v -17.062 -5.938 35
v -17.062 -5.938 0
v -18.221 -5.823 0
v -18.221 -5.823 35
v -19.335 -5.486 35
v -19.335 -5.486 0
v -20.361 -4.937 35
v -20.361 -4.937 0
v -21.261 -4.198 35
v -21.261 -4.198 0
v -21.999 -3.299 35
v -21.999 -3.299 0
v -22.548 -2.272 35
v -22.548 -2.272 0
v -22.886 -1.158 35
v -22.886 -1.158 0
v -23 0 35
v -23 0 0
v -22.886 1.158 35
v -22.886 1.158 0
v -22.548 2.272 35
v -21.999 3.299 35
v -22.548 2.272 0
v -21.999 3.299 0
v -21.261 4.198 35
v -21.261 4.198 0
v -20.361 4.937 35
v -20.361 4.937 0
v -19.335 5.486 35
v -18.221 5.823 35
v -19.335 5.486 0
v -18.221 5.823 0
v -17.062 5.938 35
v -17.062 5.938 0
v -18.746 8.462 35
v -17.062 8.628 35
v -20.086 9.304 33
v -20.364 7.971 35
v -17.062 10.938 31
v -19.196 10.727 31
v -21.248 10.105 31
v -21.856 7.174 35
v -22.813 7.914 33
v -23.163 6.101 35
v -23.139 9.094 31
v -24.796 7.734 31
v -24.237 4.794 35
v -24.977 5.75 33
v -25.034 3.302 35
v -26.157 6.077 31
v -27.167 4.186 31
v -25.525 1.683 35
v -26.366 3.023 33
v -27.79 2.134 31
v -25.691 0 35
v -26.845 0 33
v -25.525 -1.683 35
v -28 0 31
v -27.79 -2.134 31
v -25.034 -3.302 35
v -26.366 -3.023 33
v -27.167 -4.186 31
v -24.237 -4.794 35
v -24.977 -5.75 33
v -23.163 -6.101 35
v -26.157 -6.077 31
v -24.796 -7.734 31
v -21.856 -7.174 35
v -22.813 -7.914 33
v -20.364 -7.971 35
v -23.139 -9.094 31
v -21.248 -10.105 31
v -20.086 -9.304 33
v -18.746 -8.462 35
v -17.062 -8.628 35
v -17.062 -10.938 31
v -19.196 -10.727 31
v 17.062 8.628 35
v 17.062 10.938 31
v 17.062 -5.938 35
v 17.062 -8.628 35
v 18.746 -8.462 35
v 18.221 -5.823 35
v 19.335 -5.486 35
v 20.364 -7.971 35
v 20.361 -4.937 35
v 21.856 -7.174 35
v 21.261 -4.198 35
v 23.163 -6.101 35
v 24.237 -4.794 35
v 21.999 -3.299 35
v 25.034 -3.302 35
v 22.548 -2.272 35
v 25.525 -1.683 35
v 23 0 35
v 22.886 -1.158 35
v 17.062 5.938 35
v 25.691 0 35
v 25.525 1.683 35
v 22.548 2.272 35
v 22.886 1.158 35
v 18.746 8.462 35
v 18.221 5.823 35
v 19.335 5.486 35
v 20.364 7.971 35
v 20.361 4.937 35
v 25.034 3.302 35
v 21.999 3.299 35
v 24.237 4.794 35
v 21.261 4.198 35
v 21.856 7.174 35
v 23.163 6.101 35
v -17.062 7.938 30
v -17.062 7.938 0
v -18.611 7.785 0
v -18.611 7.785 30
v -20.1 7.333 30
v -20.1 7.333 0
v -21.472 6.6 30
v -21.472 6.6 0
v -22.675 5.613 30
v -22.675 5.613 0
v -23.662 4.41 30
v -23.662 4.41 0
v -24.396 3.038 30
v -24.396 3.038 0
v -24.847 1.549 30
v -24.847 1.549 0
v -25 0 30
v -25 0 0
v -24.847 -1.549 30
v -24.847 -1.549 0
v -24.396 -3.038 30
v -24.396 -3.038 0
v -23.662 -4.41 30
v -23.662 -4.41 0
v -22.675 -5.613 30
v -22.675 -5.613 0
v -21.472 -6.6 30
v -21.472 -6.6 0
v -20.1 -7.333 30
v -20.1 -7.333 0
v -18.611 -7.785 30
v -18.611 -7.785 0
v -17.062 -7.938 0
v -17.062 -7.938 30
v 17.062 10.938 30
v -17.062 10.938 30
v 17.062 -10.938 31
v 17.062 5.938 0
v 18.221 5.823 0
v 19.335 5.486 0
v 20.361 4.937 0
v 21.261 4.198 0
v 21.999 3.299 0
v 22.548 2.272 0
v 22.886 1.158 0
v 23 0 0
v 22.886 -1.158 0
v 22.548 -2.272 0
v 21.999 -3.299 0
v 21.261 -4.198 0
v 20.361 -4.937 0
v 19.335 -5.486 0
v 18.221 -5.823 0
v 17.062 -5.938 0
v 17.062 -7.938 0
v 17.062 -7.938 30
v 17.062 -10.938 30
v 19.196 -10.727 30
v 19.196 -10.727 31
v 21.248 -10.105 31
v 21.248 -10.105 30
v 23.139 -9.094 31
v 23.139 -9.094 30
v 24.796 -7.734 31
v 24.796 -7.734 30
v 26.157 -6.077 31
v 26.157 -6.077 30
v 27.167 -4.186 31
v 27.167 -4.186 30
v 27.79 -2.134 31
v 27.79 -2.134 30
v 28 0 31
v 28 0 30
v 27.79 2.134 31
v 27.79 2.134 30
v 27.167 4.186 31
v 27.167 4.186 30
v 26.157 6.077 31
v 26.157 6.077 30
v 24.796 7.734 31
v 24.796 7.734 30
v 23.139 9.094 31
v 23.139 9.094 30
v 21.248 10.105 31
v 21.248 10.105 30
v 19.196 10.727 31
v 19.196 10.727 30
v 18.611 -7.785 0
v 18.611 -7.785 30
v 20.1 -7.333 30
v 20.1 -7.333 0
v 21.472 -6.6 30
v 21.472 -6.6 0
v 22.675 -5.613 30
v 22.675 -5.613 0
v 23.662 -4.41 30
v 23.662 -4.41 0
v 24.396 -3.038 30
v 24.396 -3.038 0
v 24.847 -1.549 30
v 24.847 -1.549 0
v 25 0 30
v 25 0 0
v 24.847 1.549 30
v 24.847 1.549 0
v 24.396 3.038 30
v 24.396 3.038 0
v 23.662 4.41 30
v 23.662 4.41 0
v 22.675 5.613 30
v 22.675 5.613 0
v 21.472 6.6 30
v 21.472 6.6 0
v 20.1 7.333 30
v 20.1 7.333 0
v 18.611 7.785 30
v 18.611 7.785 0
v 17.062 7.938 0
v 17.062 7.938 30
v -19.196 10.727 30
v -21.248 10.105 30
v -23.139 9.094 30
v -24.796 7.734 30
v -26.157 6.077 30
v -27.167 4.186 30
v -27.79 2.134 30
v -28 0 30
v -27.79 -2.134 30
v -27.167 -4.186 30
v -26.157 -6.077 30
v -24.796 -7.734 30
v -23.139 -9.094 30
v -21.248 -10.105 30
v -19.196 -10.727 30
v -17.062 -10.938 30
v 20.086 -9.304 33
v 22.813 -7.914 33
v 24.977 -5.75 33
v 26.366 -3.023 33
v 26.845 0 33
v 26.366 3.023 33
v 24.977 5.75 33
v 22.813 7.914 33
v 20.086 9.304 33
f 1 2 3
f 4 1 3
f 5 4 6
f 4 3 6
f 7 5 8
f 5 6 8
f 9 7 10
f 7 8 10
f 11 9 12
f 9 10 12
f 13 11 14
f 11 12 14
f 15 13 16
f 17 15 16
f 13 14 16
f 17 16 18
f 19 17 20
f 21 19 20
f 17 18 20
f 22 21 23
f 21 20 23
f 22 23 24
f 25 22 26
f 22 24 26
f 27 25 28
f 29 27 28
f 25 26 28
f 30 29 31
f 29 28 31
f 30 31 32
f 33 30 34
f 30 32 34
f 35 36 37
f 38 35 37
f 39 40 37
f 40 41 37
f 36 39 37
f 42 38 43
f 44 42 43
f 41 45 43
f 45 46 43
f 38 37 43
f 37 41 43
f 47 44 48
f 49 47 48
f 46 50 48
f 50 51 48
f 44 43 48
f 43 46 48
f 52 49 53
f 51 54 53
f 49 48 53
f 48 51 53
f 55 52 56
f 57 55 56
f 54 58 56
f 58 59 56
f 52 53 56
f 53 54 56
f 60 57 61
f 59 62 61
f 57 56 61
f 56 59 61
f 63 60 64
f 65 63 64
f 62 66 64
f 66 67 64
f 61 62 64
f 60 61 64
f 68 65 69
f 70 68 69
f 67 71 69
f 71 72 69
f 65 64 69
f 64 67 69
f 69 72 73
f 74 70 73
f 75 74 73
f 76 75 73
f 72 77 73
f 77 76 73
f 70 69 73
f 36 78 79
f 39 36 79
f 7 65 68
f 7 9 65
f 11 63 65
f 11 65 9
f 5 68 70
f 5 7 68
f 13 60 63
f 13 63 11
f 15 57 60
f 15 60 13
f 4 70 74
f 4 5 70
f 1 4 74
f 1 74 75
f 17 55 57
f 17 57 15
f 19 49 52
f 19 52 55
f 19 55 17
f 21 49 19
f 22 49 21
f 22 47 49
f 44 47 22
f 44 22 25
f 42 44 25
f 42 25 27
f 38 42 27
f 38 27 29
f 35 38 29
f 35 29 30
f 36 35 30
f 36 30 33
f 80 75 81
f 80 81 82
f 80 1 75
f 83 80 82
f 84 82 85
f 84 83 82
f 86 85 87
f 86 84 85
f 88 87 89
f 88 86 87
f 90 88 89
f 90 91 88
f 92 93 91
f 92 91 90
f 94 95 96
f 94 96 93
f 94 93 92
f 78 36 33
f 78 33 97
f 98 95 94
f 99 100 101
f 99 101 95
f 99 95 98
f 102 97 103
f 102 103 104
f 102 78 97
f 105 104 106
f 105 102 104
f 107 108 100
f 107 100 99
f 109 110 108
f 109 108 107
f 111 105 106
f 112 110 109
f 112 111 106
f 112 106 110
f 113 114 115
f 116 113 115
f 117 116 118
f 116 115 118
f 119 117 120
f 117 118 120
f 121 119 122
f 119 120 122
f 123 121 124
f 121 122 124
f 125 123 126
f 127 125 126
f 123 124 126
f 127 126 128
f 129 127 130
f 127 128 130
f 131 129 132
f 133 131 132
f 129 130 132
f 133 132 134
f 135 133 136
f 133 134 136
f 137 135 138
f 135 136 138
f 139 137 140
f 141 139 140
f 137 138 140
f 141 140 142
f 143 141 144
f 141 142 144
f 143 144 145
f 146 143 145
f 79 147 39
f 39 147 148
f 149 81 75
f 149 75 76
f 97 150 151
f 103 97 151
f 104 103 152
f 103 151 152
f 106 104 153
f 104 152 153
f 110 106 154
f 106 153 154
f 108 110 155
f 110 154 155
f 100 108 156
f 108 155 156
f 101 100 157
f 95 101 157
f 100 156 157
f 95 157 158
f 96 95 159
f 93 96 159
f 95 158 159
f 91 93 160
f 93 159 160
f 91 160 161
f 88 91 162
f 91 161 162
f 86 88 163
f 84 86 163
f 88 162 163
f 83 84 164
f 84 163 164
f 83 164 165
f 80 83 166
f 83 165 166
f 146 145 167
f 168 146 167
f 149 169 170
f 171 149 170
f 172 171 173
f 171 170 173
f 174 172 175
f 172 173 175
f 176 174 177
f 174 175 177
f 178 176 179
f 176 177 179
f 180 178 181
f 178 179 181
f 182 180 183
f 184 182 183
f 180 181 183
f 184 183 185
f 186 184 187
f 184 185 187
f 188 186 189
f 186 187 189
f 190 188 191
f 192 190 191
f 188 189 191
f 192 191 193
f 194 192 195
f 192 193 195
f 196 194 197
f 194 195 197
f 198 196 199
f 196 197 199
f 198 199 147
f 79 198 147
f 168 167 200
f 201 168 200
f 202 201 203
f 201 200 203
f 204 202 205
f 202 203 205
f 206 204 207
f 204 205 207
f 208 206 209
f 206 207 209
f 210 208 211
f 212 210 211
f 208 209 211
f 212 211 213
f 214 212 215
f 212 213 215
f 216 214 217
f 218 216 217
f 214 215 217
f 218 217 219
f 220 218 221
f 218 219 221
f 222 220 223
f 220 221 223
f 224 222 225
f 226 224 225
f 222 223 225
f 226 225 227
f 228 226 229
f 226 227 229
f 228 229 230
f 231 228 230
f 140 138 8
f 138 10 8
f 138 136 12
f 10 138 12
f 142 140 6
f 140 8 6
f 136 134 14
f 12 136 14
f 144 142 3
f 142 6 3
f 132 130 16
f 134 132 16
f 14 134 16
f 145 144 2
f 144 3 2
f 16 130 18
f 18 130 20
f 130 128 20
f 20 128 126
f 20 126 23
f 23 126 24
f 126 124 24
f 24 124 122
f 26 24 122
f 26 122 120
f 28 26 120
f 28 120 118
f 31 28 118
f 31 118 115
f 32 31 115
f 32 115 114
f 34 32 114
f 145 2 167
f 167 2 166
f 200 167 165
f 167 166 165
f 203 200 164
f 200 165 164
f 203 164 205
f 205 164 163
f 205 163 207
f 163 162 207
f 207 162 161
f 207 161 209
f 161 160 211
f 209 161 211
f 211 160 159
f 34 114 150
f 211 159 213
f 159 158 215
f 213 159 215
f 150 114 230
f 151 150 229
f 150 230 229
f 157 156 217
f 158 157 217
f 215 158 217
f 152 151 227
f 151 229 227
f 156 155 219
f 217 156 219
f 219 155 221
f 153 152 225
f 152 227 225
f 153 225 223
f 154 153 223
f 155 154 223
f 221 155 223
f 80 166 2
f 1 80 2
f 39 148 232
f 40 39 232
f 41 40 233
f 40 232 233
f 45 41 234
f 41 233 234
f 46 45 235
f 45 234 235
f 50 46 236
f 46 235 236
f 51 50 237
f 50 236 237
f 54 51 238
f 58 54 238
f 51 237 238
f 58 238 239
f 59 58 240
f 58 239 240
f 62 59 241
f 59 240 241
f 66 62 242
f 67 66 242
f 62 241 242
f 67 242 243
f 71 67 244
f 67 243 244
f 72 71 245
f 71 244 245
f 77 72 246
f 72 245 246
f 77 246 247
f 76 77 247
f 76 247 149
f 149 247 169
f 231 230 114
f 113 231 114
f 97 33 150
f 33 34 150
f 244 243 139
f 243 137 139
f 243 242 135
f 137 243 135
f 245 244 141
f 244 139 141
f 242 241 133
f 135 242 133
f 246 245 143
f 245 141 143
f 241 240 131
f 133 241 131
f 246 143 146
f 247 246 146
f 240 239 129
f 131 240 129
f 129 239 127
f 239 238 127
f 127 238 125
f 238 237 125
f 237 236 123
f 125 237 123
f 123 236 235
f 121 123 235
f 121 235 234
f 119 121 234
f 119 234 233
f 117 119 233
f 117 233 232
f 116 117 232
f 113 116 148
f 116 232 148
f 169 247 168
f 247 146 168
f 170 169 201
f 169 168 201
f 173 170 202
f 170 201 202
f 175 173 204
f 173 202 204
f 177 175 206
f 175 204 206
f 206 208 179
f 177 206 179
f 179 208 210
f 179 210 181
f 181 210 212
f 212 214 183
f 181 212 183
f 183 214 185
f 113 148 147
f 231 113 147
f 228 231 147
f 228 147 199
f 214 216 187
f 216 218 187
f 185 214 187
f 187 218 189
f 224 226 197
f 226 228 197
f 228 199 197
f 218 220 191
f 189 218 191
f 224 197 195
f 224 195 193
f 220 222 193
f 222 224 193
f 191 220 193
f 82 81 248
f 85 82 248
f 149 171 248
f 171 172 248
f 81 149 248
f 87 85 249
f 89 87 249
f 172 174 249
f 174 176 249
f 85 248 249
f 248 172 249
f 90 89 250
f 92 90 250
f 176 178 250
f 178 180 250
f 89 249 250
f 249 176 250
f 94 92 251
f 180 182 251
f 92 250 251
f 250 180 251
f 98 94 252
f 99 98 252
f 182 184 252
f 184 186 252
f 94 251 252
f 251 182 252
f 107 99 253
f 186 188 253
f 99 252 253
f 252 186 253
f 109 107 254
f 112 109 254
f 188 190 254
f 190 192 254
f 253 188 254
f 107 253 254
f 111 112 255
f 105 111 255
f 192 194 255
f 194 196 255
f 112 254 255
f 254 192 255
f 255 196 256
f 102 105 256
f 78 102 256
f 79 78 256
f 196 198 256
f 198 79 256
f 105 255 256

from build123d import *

# Parameters (mm, degrees)
F1_DEPTH    = 30
F3_DEPTH    = 5
F4_T1_DEPTH = 34.125
F4_T4_ANGLE = 180
F4_T6_ANGLE = 180


# Not quite as in the source:
# - a fillet or chamfer that OpenCascade refuses, or shapes differently, is made with other operations: its cross-section is extruded or revolved along the edge and cut away or added


with BuildPart() as f1:
    # F0 (on Top) → F1 (new body)
    with BuildSketch(Plane.XY):
        with BuildLine():
            Line((-17.0625, -7.9375), (0, -7.9375))
            Line((0, -7.9375), (17.0625, -7.9375))
            ThreePointArc((17.0625, -7.9375), (25, 0), (17.0625, 7.9375))
            Line((17.0625, 7.9375), (0, 7.9375))
            Line((0, 7.9375), (-17.0625, 7.9375))
            ThreePointArc((-17.0625, 7.9375), (-25, 0), (-17.0625, -7.9375))
        make_face()
        with BuildLine():
            Line((-17.0625, 5.9375000447), (0, 5.9375000447))
            Line((0, 5.9375000447), (17.0625, 5.9375000447))
            ThreePointArc((17.0625, 5.9375000447), (23.0000000447, 0), (17.0625, -5.9375000447))
            Line((17.0625, -5.9375000447), (0, -5.9375000447))
            Line((0, -5.9375000447), (-17.0625, -5.9375000447))
            ThreePointArc((-17.0625, -5.9375000447), (-23.0000000447, 0), (-17.0625, 5.9375000447))
        make_face(mode=Mode.SUBTRACT)
    extrude(amount=F1_DEPTH)

    # F2 (on face) → F3 (join)
    with BuildSketch(Plane.XY.offset(30)):
        with BuildLine():
            ThreePointArc((17.0625, -10.9375000447), (28.0000000447, 0), (17.0625, 10.9375000447))
            Line((17.0625, 10.9375000447), (-17.0625, 10.9375000447))
            ThreePointArc((-17.0625, 10.9375000447), (-28.0000000447, 0), (-17.0625, -10.9375000447))
            Line((-17.0625, -10.9375000447), (17.0625, -10.9375000447))
        make_face()
        with BuildLine():
            Line((17.0625, -7.9375), (-17.0625, -7.9375))
            ThreePointArc((-17.0625, -7.9375), (-25, 0), (-17.0625, 7.9375))
            Line((-17.0625, 7.9375), (17.0625, 7.9375))
            ThreePointArc((17.0625, 7.9375), (25, 0), (17.0625, -7.9375))
        make_face(mode=Mode.SUBTRACT)
        with BuildLine():
            ThreePointArc((-17.0625, 7.9375), (-25, 0), (-17.0625, -7.9375))
            Line((-17.0625, -7.9375), (17.0625, -7.9375))
            ThreePointArc((17.0625, -7.9375), (25, 0), (17.0625, 7.9375))
            Line((17.0625, 7.9375), (-17.0625, 7.9375))
        make_face()
        with BuildLine():
            Line((-17.0625, 5.9375000447), (17.0625, 5.9375000447))
            ThreePointArc((17.0625, 5.9375000447), (23.0000000447, 0), (17.0625, -5.9375000447))
            Line((17.0625, -5.9375000447), (-17.0625, -5.9375000447))
            ThreePointArc((-17.0625, -5.9375000447), (-23.0000000447, 0), (-17.0625, 5.9375000447))
        make_face(mode=Mode.SUBTRACT)
    extrude(amount=F3_DEPTH)

    # F4: chamfer of 4 x 2.3094010768 on 4 edges, made by hand

    # F4_s2 → F4_t1 (cut)
    with BuildSketch(Plane.YZ.offset(-17.0625)):
        Polygon((-8.6280989679, 35), (-10.9375000447, 31), (-10.9375000447, 35), align=None)
        Polygon((8.6280989679, 35), (10.9375000447, 31), (10.9375000447, 35), align=None)
    extrude(amount=F4_T1_DEPTH, mode=Mode.SUBTRACT)

    # F4_s3 → F4_t4 (revolve, cut)
    with BuildSketch(Plane.YZ.offset(-17.0625)):
        Polygon((8.6280989679, 35), (10.9375000447, 31), (10.9375000447, 35), align=None)
    revolve(axis=Axis((-17.0625, 0, 35), (0, 0, 1)), revolution_arc=F4_T4_ANGLE, mode=Mode.SUBTRACT)

    # F4_s5 → F4_t6 (revolve, cut)
    with BuildSketch(Plane.YZ.offset(17.0625)):
        Polygon((-8.6280989679, 35), (-10.9375000447, 31), (-10.9375000447, 35), align=None)
    revolve(axis=Axis((17.0625, 0, 35), (0, 0, 1)), revolution_arc=F4_T6_ANGLE, mode=Mode.SUBTRACT)


solid = f1.part
